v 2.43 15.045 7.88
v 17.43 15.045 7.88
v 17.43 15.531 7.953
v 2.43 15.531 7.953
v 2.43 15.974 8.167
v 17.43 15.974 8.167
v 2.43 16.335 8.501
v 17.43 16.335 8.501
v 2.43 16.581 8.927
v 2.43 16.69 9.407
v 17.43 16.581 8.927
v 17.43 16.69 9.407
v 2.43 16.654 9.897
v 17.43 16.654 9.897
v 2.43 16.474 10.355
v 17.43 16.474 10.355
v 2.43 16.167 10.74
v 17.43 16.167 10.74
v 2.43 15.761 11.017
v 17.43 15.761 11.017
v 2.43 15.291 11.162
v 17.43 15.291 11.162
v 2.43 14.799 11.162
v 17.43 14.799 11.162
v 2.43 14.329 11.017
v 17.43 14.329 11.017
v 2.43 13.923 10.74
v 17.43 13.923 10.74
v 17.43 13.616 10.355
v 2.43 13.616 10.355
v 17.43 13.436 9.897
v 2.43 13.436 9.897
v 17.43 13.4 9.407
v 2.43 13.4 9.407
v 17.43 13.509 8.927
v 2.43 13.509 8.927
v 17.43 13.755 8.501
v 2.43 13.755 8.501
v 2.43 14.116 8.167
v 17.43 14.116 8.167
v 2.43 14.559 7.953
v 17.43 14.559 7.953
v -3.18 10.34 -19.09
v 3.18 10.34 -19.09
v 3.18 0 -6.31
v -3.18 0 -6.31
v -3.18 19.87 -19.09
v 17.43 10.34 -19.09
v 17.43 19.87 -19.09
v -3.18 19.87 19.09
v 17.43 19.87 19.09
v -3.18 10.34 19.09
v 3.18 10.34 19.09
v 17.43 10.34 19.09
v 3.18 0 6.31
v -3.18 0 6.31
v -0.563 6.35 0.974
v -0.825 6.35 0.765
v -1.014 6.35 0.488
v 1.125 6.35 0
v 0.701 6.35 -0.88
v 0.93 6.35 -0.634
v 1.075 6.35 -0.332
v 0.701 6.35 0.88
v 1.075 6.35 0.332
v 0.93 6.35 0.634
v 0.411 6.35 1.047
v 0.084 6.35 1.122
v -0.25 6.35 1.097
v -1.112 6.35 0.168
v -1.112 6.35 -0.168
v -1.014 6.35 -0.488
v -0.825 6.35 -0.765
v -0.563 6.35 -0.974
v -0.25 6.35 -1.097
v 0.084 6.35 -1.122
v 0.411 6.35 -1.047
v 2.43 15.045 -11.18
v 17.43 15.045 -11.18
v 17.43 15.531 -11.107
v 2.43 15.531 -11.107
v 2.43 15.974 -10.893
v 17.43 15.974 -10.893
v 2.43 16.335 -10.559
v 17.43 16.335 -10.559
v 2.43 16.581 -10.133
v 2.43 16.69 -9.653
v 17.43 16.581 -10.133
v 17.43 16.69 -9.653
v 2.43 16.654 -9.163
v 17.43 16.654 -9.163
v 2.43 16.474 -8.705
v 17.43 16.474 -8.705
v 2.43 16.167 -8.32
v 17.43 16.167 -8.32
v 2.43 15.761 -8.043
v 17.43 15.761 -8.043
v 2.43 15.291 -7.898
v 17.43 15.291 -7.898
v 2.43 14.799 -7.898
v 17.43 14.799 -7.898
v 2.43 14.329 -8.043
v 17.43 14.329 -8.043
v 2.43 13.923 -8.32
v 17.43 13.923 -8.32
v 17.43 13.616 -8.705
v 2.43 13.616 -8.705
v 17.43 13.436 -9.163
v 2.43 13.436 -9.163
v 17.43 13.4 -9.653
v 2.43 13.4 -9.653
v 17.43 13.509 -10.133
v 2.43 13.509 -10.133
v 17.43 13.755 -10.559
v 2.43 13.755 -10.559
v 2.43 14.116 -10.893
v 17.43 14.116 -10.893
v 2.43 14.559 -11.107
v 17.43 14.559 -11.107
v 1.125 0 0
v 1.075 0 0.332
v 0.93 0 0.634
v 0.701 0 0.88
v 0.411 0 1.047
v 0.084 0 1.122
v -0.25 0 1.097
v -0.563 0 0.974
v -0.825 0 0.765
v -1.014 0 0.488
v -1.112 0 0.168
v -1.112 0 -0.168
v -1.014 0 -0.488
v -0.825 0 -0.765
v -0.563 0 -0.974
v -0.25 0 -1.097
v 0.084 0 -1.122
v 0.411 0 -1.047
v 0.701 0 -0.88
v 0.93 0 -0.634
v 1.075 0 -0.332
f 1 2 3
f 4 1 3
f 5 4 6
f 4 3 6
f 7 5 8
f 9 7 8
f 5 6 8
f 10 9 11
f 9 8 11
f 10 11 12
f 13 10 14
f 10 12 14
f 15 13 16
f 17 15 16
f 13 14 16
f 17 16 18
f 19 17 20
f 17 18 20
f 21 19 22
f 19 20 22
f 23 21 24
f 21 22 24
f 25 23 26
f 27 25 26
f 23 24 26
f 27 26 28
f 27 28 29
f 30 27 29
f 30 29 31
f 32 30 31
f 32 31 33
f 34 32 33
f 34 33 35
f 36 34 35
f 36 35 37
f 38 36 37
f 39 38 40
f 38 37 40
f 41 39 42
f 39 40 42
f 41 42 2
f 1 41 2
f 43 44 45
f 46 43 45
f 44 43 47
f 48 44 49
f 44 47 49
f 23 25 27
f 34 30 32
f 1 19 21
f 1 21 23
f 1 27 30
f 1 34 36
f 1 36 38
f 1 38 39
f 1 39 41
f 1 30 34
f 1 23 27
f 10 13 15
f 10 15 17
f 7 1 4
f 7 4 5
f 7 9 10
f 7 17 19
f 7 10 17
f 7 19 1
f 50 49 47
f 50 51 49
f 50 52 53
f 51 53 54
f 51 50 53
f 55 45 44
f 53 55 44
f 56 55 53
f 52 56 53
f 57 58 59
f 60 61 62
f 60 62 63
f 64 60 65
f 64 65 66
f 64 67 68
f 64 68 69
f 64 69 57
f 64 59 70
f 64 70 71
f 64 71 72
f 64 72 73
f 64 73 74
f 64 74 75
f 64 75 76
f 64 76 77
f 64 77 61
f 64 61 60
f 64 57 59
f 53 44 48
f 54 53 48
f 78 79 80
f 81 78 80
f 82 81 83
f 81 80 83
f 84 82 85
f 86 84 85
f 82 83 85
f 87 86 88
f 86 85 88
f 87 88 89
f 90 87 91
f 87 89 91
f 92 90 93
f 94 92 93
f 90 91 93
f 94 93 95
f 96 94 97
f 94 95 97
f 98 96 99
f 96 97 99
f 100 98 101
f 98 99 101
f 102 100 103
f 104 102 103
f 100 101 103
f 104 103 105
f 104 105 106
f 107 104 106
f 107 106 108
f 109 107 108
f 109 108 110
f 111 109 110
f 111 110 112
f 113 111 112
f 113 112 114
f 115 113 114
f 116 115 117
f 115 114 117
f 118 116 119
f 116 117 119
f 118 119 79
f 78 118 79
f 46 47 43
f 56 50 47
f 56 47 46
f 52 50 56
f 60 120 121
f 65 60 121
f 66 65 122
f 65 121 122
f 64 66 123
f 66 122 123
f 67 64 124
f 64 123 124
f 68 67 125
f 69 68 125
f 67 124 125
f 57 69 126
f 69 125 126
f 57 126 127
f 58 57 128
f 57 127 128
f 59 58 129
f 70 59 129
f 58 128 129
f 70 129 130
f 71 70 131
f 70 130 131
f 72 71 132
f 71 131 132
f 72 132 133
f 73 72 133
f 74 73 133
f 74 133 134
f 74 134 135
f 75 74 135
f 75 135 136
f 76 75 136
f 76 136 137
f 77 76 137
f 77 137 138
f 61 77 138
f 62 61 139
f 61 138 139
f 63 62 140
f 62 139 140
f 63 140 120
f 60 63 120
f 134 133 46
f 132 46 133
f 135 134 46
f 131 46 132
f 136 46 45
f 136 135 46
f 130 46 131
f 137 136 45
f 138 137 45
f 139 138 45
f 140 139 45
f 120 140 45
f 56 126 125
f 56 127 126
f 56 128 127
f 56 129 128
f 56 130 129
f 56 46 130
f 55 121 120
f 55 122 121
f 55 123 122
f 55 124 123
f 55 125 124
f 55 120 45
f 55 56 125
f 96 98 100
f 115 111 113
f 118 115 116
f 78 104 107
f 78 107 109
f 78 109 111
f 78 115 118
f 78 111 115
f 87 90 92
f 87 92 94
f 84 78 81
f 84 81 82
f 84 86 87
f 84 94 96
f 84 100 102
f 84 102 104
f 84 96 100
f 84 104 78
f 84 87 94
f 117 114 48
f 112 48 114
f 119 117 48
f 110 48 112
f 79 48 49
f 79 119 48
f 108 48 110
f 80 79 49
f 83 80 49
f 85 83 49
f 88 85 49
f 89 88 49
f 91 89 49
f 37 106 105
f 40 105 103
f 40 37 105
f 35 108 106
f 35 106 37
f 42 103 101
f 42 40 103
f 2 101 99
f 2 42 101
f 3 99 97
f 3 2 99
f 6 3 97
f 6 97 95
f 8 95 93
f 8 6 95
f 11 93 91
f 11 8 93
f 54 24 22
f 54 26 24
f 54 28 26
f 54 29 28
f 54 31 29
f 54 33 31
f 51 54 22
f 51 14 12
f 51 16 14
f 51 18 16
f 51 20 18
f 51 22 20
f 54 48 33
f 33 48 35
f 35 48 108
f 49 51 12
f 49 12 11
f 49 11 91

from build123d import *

# Parameters (mm, degrees)
BOSS_EXTRUDE1_DEPTH      = 19.09
BOSS_EXTRUDE1_DEPTH_BACK = 19.09
CUT_EXTRUDE1_DEPTH       = 32.021081541
SKETCH3_R                = 1.125
CUT_EXTRUDE2_DEPTH       = 6.35
SKETCH4_R                = 1.65
CUT_EXTRUDE3_DEPTH       = 15


with BuildPart() as part:
    # Sketch1 → Boss-Extrude1 (new, two sides: drawn at the far end of the back side and taken through both)
    with BuildSketch(Plane.XY.offset(-BOSS_EXTRUDE1_DEPTH_BACK)):
        Polygon((-3.18, 0), (3.18, 0), (3.18, 10.34), (17.43, 10.34), (17.43, 19.87), (-3.18, 19.87), align=None)
    extrude(amount=BOSS_EXTRUDE1_DEPTH + BOSS_EXTRUDE1_DEPTH_BACK)

    # Sketch2 → Cut-Extrude1 (cut, through all)
    with BuildSketch(Plane(origin=(3.18, 0, 0), x_dir=(0, 0, -1), z_dir=(1, 0, 0))):
        Polygon((19.09, 10.34), (6.31, 0), (19.09, 0), align=None)
        Polygon((-19.09, 10.34), (-19.09, 0), (-6.31, 0), align=None)
    extrude(amount=-CUT_EXTRUDE1_DEPTH, mode=Mode.SUBTRACT)

    # Sketch3 → Cut-Extrude2 (cut)
    with BuildSketch(Plane.XZ):
        Circle(SKETCH3_R)
    extrude(amount=-CUT_EXTRUDE2_DEPTH, mode=Mode.SUBTRACT)

    # Sketch4 → Cut-Extrude3 (cut)
    with BuildSketch(Plane(origin=(17.43, 0, 0), x_dir=(0, 0, -1), z_dir=(1, 0, 0))):
        with Locations((9.53, 15.045)):
            Circle(SKETCH4_R)
        with Locations((-9.53, 15.045)):
            Circle(SKETCH4_R)
    extrude(amount=-CUT_EXTRUDE3_DEPTH, mode=Mode.SUBTRACT)


solid = part.part
